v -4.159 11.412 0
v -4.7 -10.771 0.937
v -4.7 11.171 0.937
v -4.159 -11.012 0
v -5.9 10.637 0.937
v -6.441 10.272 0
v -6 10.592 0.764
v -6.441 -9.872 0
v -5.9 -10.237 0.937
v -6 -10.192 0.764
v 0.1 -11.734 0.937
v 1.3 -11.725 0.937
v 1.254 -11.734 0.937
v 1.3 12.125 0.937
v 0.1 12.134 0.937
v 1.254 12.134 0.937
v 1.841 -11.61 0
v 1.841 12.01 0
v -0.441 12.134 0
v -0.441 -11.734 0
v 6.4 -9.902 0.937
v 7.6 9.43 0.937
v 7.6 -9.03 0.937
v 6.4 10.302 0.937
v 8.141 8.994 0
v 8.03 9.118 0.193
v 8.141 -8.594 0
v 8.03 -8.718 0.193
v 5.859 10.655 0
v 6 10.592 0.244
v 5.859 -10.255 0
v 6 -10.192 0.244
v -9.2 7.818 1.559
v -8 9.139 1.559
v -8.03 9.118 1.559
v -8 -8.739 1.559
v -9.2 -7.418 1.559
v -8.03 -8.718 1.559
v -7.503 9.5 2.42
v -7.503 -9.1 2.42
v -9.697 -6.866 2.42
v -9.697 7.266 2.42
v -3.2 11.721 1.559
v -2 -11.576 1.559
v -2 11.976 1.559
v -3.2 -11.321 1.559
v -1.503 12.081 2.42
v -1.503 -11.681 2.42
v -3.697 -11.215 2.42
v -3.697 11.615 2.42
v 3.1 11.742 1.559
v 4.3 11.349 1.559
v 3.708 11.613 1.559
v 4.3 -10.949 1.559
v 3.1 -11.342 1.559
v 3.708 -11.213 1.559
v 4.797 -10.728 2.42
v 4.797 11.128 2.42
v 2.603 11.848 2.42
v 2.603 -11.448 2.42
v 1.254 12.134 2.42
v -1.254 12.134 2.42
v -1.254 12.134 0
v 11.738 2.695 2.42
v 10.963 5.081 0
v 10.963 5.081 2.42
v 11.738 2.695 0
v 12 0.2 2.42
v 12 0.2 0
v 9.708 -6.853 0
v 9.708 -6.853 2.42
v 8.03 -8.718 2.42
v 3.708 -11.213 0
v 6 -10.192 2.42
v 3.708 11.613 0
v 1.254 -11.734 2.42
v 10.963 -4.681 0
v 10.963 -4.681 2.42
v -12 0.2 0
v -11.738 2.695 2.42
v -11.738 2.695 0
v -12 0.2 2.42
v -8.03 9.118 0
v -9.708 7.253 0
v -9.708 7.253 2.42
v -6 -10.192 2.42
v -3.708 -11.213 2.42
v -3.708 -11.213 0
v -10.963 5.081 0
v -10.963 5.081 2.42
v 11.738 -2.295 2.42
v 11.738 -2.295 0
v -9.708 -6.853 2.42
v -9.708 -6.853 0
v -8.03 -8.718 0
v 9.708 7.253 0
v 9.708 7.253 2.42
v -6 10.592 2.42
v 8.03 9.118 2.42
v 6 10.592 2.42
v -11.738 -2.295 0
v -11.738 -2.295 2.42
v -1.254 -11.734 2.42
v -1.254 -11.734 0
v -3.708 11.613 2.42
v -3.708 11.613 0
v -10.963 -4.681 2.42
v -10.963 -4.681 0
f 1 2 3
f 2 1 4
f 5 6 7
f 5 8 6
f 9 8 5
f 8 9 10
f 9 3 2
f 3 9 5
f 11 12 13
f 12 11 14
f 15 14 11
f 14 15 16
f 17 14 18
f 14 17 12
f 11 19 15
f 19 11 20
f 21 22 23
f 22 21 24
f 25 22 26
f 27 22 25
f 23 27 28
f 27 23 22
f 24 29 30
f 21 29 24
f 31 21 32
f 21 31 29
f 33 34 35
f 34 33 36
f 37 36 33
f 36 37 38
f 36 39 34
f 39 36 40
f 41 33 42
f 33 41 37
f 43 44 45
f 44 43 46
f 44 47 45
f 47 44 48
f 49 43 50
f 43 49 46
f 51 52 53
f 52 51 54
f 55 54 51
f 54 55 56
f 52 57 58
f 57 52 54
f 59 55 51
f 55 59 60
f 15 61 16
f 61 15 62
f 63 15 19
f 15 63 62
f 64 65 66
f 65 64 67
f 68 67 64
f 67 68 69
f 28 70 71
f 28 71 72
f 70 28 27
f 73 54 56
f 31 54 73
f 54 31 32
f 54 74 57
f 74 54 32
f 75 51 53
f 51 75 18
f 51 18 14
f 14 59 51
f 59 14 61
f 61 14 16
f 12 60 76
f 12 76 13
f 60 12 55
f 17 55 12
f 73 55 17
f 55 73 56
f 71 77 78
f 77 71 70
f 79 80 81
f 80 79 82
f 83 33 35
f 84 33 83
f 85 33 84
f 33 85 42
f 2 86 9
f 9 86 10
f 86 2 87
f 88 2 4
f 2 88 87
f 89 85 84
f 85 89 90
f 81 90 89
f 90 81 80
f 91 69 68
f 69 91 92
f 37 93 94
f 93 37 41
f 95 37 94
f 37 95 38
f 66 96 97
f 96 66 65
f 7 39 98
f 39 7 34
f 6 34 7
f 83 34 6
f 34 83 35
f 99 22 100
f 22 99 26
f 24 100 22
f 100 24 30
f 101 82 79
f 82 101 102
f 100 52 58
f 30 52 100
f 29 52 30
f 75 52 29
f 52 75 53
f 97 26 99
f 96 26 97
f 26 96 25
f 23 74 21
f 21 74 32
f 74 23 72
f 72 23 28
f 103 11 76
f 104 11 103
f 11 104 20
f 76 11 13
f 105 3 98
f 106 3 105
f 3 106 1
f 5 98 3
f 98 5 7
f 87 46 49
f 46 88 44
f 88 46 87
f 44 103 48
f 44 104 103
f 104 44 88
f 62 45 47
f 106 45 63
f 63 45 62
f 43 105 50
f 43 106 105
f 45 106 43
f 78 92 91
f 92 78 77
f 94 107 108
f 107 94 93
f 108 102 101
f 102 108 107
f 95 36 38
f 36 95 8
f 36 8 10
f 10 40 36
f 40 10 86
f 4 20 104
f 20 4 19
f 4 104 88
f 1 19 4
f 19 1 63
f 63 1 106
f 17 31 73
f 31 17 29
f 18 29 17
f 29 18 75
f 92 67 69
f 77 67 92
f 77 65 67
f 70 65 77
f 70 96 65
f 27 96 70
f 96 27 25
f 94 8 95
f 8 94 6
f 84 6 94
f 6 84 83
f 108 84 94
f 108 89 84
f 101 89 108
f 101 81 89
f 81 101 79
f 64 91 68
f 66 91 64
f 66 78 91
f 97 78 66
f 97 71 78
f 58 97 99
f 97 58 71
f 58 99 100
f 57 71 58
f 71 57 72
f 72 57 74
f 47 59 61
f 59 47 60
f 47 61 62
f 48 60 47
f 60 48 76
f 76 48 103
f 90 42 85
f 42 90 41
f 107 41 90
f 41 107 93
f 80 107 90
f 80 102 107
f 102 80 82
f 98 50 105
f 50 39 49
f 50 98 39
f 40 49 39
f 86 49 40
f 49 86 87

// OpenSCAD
raio = 12;
module ranhuras() {
  translate([6.7*raio/12, -raio, -.002]) rotate([-90, 0, 0]) cylinder(r=1.2*raio/12, $fn=6, h=2*raio+1);
  translate([12.7*raio/12, -raio, -.002]) rotate([-90, 0, 0]) cylinder(r=1.2*raio/12, $fn=6, h=2*raio+1);
  translate([19.0*raio/12, -raio, -.002]) rotate([-90, 0, 0]) cylinder(r=1.2*raio/12, $fn=6, h=2*raio+1);
}

module ficha(){
  difference() {
    translate([raio,0.2,0])
    cylinder(r=raio, h=2.42*raio/12);
    translate([0, 0, -0.1]) ranhuras();
    translate([-3.3, 0, 2*1.3*raio/12]) ranhuras();
  }
}

translate([-12, 0, 0]) ficha();
